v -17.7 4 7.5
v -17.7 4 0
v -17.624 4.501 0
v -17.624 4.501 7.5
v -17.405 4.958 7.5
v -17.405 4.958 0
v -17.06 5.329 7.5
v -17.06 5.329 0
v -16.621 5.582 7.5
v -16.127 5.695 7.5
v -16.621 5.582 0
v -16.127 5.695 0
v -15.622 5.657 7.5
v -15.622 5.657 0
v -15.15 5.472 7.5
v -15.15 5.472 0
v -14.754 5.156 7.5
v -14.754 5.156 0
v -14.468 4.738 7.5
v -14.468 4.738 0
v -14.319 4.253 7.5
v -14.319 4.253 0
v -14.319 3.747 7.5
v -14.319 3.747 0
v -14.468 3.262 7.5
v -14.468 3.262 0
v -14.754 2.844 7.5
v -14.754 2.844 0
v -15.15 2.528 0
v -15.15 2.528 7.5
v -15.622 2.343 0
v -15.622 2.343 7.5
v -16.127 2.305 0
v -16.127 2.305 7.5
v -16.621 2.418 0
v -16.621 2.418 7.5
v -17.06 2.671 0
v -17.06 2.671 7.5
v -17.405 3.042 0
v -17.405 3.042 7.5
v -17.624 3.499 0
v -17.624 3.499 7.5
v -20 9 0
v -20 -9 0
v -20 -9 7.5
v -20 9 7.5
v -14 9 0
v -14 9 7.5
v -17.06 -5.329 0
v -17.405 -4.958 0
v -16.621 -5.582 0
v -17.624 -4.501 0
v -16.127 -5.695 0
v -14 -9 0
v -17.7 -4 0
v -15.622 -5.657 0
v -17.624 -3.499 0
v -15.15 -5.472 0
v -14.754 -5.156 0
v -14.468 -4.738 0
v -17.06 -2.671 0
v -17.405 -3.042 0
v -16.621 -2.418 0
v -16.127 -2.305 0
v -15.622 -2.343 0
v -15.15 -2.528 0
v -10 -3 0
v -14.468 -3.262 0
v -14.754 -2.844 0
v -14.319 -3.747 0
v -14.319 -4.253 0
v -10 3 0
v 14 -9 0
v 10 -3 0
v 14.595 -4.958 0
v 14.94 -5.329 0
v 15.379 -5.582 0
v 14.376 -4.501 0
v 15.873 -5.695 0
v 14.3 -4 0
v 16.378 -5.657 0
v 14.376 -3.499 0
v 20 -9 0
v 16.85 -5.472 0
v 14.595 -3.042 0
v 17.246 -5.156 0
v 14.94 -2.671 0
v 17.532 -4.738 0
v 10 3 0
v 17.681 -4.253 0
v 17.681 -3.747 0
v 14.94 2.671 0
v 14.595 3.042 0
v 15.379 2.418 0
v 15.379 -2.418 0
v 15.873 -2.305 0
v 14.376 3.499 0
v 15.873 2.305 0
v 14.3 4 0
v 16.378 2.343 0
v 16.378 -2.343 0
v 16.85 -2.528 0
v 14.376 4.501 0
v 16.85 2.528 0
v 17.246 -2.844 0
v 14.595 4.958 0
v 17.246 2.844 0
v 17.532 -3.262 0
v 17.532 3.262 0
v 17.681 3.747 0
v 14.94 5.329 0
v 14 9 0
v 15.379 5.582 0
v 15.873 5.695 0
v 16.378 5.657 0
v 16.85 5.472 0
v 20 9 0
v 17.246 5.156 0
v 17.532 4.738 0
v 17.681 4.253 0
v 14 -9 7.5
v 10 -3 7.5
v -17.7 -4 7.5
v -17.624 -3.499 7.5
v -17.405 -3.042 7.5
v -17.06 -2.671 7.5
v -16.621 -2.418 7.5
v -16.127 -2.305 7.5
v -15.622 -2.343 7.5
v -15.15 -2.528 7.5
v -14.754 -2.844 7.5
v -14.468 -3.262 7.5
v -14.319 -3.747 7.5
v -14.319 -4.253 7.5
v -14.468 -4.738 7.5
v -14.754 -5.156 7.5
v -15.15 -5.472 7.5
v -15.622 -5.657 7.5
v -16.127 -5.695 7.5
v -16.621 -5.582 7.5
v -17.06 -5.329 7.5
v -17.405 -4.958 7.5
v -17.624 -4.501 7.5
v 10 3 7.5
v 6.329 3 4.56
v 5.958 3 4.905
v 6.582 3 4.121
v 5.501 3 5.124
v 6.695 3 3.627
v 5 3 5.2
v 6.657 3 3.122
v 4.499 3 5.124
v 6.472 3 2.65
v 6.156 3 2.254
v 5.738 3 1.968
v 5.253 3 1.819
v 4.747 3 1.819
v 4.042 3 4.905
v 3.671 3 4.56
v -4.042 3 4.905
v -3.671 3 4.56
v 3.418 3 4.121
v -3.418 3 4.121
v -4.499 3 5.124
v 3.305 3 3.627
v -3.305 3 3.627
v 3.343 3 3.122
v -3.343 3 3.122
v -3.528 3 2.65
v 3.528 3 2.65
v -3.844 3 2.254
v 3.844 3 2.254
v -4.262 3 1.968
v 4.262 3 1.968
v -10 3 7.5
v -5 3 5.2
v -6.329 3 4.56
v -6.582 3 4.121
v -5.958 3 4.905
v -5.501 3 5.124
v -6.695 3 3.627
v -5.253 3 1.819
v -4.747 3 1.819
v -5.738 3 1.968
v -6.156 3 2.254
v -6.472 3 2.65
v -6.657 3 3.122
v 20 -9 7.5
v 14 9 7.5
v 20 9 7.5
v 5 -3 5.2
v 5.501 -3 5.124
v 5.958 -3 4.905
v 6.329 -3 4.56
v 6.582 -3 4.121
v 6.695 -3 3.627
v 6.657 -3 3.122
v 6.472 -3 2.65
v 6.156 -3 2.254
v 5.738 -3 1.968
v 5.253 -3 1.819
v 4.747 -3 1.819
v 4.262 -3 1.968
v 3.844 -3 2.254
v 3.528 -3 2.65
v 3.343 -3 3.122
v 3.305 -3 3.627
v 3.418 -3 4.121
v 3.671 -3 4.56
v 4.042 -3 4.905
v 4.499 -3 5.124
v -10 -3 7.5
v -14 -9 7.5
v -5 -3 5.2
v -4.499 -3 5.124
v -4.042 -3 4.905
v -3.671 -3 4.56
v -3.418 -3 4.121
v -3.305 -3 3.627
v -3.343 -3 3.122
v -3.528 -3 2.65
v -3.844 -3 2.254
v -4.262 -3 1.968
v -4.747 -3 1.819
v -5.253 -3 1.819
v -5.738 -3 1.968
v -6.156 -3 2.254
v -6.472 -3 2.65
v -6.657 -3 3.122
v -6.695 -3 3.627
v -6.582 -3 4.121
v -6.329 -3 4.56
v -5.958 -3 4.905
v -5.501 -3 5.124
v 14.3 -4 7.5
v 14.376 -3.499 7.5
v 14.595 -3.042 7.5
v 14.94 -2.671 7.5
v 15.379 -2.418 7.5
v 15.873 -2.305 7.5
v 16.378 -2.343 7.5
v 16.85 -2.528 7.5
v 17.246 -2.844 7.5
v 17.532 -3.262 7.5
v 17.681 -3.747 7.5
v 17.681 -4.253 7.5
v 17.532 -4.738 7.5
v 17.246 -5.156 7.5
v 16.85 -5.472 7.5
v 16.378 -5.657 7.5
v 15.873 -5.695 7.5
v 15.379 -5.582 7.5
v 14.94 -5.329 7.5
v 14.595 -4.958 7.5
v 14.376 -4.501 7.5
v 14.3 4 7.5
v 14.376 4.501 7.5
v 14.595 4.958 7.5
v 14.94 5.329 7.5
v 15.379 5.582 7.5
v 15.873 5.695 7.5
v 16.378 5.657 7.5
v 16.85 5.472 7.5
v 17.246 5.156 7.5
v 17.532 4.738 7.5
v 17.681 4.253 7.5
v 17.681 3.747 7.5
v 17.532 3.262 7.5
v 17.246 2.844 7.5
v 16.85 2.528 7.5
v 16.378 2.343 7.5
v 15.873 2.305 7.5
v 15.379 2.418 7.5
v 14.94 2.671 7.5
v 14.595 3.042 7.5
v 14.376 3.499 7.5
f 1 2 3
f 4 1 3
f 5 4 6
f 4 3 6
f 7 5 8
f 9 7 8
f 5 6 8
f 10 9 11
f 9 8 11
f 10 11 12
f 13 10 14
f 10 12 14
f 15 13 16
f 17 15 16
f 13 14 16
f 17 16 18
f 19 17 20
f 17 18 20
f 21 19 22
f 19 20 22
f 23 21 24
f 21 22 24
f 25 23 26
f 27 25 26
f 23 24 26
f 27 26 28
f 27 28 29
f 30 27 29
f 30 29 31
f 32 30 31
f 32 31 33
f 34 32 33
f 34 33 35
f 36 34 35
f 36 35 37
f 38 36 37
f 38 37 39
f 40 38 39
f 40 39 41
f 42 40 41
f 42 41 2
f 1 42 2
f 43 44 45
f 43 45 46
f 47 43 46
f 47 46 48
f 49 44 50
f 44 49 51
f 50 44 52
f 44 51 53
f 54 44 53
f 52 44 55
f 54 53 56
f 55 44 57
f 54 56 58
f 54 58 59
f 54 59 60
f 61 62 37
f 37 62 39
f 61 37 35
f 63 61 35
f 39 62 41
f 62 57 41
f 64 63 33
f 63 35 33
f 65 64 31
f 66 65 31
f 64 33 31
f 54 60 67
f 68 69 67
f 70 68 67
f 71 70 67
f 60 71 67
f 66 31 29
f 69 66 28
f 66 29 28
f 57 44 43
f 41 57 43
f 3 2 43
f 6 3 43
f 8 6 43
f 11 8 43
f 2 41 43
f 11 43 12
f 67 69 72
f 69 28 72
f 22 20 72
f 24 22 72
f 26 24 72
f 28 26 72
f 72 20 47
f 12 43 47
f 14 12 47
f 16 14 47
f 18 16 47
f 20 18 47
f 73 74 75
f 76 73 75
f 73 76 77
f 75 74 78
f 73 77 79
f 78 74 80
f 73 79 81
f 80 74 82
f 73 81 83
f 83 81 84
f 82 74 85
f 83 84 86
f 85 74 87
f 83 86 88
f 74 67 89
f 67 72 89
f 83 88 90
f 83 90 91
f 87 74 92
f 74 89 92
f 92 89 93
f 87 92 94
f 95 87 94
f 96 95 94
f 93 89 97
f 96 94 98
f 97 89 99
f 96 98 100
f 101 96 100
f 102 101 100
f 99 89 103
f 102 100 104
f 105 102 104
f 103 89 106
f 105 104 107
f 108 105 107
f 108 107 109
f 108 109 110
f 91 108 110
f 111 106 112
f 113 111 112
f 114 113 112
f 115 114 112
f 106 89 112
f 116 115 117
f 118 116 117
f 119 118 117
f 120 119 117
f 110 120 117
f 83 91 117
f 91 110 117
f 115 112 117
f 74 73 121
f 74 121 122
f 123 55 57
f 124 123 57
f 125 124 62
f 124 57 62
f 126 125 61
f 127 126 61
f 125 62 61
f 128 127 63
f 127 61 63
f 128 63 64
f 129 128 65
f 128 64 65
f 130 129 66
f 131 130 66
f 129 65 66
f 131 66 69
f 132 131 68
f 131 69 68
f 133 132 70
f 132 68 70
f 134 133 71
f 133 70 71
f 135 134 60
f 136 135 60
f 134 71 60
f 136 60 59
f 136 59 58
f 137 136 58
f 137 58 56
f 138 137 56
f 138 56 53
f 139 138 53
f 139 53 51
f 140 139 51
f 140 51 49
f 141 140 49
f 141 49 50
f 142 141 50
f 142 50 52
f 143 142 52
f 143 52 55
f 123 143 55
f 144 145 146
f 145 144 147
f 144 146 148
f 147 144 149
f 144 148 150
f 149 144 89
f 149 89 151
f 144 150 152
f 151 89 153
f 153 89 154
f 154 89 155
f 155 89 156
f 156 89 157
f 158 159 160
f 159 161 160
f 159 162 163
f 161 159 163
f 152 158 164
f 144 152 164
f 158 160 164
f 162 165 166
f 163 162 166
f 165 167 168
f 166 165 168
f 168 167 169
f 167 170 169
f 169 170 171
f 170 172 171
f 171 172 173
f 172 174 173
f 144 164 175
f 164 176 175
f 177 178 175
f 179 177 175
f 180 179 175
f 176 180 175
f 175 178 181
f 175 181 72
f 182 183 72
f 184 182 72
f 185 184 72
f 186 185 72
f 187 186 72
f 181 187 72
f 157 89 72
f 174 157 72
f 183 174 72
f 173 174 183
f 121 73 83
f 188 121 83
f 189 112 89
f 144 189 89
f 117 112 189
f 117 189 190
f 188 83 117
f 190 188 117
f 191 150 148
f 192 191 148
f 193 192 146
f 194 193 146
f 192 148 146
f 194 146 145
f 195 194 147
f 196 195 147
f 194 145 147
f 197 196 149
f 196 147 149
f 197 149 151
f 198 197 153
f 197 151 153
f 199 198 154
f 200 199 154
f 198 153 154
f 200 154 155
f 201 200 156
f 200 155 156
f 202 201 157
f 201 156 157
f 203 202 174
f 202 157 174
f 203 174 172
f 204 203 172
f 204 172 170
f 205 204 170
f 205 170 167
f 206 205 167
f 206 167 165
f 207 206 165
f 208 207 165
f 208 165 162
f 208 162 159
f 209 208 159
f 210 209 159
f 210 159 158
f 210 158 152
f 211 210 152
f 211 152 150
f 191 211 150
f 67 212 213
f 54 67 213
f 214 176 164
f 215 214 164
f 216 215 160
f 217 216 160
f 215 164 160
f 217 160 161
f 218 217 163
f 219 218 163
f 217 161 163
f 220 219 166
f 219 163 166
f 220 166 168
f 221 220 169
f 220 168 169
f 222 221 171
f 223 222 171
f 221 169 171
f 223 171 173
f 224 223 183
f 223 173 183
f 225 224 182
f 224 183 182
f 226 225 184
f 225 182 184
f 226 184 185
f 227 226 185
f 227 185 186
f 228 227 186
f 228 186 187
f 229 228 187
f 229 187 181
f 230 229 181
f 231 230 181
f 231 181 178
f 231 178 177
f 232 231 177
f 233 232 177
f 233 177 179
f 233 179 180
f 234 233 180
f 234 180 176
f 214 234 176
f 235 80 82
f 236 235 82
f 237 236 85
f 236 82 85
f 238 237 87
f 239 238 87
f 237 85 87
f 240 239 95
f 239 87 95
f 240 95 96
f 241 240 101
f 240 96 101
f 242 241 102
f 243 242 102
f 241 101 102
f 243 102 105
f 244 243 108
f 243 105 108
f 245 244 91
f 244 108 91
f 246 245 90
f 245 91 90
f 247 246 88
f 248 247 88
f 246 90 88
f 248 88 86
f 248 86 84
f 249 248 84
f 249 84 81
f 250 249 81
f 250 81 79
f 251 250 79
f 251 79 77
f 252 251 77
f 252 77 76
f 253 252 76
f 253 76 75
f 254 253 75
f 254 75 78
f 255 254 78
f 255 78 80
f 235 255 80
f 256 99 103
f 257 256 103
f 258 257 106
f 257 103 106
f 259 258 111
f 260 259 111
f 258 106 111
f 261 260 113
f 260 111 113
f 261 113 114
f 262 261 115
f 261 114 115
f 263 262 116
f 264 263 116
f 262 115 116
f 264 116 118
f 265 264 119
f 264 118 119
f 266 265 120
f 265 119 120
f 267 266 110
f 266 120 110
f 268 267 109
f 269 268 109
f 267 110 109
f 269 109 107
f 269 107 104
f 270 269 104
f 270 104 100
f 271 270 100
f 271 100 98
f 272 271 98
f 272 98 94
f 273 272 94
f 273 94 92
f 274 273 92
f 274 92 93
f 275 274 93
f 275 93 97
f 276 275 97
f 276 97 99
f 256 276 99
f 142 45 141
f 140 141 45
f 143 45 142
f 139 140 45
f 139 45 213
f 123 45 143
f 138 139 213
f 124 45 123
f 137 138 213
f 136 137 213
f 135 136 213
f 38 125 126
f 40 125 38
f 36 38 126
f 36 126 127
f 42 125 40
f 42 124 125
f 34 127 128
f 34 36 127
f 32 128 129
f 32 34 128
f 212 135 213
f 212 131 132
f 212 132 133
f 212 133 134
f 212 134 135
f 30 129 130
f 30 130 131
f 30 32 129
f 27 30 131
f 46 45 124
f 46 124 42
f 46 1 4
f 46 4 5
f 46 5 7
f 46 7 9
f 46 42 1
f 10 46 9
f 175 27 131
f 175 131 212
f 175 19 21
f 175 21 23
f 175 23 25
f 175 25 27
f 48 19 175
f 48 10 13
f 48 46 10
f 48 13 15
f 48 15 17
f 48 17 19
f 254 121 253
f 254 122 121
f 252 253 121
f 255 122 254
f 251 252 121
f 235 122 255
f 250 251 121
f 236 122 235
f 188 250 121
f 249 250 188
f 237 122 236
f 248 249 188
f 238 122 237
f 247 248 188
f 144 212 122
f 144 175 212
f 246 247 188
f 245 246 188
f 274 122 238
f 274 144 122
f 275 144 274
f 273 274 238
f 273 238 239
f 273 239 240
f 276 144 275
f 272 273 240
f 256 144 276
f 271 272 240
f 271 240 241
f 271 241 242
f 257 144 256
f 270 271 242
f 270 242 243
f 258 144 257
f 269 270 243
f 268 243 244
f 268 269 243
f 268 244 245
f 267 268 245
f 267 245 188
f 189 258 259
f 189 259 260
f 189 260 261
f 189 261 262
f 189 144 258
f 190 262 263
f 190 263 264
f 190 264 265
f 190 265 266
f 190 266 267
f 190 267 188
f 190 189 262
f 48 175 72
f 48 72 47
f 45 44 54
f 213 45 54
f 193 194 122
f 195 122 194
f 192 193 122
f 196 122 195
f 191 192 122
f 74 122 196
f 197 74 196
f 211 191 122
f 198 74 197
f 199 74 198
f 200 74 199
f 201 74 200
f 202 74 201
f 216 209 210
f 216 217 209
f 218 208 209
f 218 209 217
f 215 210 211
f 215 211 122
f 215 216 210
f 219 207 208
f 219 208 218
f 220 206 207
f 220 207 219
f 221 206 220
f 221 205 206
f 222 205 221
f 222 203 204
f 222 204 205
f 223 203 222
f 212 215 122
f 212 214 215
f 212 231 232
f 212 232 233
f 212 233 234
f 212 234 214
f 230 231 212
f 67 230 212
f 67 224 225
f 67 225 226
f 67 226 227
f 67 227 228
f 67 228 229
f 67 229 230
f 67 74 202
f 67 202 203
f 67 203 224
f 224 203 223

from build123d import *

# Parameters (mm, degrees)
SKETCH1_W           = 40
SKETCH1_H           = 18
BOSS_EXTRUDE1_DEPTH = 7.5
SKETCH2_R           = 1.7
CUT_EXTRUDE1_DEPTH  = 24.178653973
SKETCH3_R           = 1.7
CUT_EXTRUDE2_DEPTH  = 25.5


with BuildPart() as part:
    # Sketch1 → Boss-Extrude1 (new body)
    with BuildSketch(Plane.XY):
        Rectangle(SKETCH1_W, SKETCH1_H)
    extrude(amount=BOSS_EXTRUDE1_DEPTH)

    # Sketch2 → Cut-Extrude1 (cut, through all)
    with BuildSketch(Plane(origin=(0, 0, 0), x_dir=(-1, 0, 0), z_dir=(0, 0, -1))):
        with Locations((-16, 4)):
            Circle(SKETCH2_R)
        with Locations((-16, -4)):
            Circle(SKETCH2_R)
        with Locations((16, 4)):
            Circle(SKETCH2_R)
        with Locations((16, -4)):
            Circle(SKETCH2_R)
        Polygon((10, -3), (14, -9), (-14, -9), (-10, -3), align=None)
        Polygon((-14, 9), (-10, 3), (10, 3), (14, 9), align=None)
    extrude(amount=-CUT_EXTRUDE1_DEPTH, mode=Mode.SUBTRACT)

    # Sketch3 → Cut-Extrude2 (cut, through all)
    with BuildSketch(Plane(origin=(0, 3, 0), x_dir=(1, 0, 0), z_dir=(0, 1, 0))):
        with Locations(Location((-5, -3.5, 0), (0, 0, 270))):
            Circle(SKETCH3_R)
        with Locations(Location((5, -3.5, 0), (0, 0, 270))):
            Circle(SKETCH3_R)
    extrude(amount=-CUT_EXTRUDE2_DEPTH, mode=Mode.SUBTRACT)


solid = part.part
